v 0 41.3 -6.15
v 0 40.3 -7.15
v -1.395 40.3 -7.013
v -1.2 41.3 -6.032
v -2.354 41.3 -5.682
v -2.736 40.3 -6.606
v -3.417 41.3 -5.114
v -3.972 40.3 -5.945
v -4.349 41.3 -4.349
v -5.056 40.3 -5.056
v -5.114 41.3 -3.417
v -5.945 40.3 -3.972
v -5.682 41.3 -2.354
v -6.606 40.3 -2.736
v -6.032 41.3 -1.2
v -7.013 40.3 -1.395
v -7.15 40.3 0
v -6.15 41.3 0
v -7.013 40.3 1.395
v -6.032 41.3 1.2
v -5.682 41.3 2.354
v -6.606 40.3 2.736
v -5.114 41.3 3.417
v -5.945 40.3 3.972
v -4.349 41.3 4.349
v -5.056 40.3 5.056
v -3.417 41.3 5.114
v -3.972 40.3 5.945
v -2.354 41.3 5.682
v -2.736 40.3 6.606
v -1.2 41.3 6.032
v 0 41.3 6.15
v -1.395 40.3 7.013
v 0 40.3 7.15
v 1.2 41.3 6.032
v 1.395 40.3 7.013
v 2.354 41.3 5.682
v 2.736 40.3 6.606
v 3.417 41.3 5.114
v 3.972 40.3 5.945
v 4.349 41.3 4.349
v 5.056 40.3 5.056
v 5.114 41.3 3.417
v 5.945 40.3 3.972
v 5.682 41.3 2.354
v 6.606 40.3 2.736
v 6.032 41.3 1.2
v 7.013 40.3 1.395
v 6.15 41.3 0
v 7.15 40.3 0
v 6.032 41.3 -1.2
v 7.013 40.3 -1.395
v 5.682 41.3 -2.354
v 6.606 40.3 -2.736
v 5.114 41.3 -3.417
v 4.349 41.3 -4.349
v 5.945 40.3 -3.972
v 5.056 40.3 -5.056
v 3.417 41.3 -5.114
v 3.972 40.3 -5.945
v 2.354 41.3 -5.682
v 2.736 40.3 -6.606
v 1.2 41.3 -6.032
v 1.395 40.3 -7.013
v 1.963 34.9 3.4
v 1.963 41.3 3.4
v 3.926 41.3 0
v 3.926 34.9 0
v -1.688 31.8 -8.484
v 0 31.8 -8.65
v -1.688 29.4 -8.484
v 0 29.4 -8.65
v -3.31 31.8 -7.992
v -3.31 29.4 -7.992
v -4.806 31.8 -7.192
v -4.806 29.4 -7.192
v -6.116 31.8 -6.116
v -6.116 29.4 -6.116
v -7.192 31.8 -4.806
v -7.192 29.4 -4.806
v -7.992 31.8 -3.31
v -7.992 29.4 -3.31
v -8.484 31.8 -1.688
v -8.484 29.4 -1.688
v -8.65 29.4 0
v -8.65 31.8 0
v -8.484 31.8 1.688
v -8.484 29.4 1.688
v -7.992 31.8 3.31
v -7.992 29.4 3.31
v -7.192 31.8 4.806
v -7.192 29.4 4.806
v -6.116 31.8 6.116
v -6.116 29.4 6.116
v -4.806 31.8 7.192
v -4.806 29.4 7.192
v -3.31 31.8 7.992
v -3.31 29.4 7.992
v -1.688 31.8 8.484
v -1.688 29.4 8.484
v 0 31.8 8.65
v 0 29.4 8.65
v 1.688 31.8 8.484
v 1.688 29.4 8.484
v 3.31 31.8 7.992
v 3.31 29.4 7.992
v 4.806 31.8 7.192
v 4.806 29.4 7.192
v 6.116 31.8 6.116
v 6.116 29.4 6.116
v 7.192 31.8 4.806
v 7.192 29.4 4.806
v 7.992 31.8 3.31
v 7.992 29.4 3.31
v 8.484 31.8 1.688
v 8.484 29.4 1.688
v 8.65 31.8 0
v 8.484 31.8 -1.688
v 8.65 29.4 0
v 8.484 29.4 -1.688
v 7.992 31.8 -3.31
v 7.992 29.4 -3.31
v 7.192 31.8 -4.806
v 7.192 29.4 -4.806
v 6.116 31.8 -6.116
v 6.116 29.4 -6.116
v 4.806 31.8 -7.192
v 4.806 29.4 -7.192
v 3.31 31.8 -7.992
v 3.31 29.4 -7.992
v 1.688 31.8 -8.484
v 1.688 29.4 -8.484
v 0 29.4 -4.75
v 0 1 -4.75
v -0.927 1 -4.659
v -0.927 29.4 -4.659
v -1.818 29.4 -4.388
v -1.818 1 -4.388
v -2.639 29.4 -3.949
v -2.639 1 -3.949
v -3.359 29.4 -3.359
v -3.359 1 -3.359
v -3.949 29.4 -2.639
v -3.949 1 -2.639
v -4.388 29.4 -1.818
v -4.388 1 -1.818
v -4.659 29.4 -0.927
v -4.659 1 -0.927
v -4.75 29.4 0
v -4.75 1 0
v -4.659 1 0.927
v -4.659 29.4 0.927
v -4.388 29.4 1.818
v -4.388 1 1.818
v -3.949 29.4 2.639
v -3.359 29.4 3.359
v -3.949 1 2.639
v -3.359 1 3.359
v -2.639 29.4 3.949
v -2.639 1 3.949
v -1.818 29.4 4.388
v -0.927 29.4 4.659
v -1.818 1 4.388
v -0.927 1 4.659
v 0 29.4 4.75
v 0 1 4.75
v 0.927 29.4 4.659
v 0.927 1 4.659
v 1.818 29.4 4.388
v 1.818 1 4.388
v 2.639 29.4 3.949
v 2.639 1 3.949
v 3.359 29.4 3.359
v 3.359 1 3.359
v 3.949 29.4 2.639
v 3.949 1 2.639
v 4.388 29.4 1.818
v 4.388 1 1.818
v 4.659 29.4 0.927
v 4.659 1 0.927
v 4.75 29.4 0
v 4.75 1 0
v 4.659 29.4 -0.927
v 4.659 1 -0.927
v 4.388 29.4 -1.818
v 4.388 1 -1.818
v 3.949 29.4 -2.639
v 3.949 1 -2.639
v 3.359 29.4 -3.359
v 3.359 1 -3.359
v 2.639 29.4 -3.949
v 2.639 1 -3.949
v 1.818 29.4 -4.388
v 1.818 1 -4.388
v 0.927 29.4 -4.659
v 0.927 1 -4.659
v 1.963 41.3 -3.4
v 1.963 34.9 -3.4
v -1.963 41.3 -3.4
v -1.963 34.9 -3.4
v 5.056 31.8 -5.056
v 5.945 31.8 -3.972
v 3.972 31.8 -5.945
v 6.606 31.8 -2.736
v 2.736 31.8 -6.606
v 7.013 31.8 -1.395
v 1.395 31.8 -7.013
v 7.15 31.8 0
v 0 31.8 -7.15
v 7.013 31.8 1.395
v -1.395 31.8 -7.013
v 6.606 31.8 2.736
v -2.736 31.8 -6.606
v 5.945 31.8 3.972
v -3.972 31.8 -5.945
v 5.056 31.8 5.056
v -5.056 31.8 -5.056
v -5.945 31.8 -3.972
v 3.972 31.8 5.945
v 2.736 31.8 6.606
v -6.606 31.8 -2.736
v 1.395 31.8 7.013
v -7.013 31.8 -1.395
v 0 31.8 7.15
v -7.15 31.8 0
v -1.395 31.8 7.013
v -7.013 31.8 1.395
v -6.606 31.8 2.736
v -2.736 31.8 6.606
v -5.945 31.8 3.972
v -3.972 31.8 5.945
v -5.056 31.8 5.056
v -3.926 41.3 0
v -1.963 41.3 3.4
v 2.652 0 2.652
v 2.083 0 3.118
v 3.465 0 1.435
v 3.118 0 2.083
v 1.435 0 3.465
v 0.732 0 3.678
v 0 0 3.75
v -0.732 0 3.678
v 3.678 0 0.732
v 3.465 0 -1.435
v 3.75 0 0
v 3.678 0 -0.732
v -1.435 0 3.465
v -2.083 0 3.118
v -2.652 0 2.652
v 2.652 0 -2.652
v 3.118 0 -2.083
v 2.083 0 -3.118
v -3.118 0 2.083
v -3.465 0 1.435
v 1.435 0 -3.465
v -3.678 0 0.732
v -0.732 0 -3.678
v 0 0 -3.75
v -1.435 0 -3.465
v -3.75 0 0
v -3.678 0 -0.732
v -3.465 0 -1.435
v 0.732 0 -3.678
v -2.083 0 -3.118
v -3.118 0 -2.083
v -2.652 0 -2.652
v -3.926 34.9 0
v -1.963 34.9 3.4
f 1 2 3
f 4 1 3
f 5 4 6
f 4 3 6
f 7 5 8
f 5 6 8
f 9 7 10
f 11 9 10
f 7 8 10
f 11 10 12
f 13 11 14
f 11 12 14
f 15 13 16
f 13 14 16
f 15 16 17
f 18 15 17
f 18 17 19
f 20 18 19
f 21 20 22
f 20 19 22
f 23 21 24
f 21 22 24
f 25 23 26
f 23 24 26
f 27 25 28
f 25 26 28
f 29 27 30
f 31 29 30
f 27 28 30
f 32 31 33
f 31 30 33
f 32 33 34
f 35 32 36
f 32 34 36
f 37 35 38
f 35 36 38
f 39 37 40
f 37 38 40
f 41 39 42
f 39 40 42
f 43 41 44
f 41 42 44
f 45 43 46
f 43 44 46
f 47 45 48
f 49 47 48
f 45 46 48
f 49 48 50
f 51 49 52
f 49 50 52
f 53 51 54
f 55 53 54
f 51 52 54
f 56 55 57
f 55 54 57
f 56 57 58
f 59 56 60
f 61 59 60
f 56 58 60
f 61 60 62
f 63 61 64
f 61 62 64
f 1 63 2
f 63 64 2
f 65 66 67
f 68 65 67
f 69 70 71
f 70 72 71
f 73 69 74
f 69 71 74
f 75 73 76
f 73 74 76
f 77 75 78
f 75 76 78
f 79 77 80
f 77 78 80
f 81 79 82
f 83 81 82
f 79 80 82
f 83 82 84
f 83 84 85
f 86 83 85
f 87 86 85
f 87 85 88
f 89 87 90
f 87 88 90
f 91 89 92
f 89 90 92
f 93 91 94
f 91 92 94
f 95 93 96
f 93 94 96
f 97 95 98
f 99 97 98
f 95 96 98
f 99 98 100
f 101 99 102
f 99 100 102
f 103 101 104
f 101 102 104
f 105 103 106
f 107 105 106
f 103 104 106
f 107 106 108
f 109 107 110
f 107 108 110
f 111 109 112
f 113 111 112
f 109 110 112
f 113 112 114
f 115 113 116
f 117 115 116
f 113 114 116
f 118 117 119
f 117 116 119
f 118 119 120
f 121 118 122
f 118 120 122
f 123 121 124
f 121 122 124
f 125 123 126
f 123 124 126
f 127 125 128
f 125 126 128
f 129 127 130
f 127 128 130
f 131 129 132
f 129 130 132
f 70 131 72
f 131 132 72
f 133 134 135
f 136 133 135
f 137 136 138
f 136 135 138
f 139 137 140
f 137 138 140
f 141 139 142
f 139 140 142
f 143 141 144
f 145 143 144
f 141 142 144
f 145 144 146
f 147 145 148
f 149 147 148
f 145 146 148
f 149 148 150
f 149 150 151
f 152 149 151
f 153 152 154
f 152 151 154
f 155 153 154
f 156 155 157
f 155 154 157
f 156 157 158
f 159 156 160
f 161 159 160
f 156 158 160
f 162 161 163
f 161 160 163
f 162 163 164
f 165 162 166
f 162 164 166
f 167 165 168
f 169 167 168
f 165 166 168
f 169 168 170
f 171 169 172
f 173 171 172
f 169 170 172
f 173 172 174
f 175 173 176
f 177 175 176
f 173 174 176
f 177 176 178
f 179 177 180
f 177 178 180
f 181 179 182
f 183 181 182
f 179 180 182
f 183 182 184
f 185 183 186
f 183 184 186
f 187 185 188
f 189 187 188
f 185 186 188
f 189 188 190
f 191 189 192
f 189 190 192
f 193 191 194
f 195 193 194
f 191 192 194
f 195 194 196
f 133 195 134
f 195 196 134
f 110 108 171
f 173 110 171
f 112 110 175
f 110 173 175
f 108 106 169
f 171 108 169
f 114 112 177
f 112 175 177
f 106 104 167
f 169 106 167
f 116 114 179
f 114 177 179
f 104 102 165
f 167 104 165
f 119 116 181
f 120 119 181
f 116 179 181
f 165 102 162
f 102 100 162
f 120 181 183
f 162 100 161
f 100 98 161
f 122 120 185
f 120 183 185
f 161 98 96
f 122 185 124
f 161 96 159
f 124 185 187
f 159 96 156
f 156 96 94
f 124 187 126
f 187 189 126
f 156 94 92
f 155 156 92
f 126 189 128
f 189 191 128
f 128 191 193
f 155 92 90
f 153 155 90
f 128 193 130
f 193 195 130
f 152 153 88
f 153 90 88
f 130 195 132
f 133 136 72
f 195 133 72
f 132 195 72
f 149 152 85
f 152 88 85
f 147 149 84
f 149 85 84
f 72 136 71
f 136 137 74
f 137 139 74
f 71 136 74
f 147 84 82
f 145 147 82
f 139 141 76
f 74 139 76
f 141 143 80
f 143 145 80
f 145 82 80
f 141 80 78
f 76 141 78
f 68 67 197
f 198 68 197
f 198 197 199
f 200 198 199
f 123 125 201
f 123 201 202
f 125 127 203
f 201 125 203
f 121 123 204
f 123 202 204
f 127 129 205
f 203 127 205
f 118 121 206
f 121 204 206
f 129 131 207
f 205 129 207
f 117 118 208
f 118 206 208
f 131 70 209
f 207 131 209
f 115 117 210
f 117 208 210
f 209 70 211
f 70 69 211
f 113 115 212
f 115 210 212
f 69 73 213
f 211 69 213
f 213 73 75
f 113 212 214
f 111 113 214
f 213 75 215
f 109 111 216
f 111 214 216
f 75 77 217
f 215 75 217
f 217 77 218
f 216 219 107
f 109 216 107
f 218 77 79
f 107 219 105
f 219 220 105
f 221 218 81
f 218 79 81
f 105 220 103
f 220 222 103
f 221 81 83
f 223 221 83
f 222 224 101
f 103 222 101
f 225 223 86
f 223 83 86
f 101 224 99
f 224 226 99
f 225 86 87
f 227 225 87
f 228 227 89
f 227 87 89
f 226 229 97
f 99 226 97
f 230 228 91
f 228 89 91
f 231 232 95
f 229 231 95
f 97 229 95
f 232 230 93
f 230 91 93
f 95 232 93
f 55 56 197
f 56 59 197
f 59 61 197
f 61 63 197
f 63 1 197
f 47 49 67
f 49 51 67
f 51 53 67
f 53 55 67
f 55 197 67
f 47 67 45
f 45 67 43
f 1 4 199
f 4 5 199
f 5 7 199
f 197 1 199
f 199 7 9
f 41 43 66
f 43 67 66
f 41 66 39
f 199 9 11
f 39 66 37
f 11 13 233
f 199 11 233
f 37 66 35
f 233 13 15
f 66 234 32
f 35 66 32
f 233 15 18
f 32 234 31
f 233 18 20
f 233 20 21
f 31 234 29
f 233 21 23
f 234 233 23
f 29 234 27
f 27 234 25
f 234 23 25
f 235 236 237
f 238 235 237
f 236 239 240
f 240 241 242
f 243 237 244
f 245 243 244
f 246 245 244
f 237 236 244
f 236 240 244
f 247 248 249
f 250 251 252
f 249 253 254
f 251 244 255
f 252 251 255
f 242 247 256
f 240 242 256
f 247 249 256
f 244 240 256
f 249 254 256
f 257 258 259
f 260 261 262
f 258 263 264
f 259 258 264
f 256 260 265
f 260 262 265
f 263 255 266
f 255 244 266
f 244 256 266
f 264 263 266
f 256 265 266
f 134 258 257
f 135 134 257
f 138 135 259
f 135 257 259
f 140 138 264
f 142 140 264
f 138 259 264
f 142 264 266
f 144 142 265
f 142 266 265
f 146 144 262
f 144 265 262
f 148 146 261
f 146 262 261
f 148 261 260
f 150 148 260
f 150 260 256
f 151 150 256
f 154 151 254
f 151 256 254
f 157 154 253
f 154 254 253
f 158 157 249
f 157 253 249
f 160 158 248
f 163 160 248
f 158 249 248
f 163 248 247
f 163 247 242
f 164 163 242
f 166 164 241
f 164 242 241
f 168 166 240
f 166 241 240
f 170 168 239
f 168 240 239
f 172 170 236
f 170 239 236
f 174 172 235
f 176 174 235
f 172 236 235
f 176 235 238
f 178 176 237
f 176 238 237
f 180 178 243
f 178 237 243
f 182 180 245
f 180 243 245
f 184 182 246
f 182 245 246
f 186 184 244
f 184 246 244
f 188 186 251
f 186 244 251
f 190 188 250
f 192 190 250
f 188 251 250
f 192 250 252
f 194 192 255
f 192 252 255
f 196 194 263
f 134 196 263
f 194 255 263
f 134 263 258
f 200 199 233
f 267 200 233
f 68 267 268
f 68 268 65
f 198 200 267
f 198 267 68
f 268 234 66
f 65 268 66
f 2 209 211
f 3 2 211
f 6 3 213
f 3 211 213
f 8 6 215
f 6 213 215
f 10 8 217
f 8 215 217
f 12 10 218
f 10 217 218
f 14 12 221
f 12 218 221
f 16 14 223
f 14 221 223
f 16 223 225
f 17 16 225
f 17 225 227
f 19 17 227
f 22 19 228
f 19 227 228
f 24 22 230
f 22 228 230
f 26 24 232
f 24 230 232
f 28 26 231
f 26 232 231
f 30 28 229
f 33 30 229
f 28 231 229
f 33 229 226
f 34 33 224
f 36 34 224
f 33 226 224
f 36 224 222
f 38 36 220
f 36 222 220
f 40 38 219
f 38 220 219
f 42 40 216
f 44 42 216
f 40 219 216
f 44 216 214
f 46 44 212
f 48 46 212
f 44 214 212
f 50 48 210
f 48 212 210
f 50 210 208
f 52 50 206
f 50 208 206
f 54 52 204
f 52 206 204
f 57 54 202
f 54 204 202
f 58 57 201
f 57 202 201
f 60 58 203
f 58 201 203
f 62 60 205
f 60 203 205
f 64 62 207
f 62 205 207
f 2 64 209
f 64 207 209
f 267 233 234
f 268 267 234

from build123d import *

# Parameters (mm, degrees)
CUT_EXTRUDE1_DEPTH = 6.4
CHAMFER1_SIZE      = 1


with BuildPart() as part:
    # Sketch1 → Revolve1 (revolve)
    with BuildSketch(Plane.XY, mode=Mode.PRIVATE) as revolve1_sk:
        Polygon((0, 0), (0, 41.3), (7.15, 41.3), (7.15, 31.8), (8.65, 31.8), (8.65, 29.4), (4.75, 29.4), (4.75, 0), align=None)
    revolve(revolve1_sk.sketch.rotate(Axis((0, 0, 0), (0, 1, 0)), 90), axis=Axis((0, 0, 0), (0, 1, 0)))

    # Sketch2 → Cut-Extrude1 (cut)
    with BuildSketch(Plane(origin=(0, 41.3, 0), x_dir=(1, 0, 0), z_dir=(0, 1, 0))):
        Polygon((3.92598183, 0), (1.962990915, 3.4), (-1.962990915, 3.4), (-3.92598183, 0), (-1.962990915, -3.4), (1.962990915, -3.4), align=None)
    extrude(amount=-CUT_EXTRUDE1_DEPTH, mode=Mode.SUBTRACT)

    # Chamfer1
    chamfer1_edges = [part.edges().sort_by_distance(p)[0] for p in [
        (0, 0, 4.75),
        (0, 41.3, 7.15),
    ]]
    chamfer(chamfer1_edges, length=CHAMFER1_SIZE)


solid = part.part
